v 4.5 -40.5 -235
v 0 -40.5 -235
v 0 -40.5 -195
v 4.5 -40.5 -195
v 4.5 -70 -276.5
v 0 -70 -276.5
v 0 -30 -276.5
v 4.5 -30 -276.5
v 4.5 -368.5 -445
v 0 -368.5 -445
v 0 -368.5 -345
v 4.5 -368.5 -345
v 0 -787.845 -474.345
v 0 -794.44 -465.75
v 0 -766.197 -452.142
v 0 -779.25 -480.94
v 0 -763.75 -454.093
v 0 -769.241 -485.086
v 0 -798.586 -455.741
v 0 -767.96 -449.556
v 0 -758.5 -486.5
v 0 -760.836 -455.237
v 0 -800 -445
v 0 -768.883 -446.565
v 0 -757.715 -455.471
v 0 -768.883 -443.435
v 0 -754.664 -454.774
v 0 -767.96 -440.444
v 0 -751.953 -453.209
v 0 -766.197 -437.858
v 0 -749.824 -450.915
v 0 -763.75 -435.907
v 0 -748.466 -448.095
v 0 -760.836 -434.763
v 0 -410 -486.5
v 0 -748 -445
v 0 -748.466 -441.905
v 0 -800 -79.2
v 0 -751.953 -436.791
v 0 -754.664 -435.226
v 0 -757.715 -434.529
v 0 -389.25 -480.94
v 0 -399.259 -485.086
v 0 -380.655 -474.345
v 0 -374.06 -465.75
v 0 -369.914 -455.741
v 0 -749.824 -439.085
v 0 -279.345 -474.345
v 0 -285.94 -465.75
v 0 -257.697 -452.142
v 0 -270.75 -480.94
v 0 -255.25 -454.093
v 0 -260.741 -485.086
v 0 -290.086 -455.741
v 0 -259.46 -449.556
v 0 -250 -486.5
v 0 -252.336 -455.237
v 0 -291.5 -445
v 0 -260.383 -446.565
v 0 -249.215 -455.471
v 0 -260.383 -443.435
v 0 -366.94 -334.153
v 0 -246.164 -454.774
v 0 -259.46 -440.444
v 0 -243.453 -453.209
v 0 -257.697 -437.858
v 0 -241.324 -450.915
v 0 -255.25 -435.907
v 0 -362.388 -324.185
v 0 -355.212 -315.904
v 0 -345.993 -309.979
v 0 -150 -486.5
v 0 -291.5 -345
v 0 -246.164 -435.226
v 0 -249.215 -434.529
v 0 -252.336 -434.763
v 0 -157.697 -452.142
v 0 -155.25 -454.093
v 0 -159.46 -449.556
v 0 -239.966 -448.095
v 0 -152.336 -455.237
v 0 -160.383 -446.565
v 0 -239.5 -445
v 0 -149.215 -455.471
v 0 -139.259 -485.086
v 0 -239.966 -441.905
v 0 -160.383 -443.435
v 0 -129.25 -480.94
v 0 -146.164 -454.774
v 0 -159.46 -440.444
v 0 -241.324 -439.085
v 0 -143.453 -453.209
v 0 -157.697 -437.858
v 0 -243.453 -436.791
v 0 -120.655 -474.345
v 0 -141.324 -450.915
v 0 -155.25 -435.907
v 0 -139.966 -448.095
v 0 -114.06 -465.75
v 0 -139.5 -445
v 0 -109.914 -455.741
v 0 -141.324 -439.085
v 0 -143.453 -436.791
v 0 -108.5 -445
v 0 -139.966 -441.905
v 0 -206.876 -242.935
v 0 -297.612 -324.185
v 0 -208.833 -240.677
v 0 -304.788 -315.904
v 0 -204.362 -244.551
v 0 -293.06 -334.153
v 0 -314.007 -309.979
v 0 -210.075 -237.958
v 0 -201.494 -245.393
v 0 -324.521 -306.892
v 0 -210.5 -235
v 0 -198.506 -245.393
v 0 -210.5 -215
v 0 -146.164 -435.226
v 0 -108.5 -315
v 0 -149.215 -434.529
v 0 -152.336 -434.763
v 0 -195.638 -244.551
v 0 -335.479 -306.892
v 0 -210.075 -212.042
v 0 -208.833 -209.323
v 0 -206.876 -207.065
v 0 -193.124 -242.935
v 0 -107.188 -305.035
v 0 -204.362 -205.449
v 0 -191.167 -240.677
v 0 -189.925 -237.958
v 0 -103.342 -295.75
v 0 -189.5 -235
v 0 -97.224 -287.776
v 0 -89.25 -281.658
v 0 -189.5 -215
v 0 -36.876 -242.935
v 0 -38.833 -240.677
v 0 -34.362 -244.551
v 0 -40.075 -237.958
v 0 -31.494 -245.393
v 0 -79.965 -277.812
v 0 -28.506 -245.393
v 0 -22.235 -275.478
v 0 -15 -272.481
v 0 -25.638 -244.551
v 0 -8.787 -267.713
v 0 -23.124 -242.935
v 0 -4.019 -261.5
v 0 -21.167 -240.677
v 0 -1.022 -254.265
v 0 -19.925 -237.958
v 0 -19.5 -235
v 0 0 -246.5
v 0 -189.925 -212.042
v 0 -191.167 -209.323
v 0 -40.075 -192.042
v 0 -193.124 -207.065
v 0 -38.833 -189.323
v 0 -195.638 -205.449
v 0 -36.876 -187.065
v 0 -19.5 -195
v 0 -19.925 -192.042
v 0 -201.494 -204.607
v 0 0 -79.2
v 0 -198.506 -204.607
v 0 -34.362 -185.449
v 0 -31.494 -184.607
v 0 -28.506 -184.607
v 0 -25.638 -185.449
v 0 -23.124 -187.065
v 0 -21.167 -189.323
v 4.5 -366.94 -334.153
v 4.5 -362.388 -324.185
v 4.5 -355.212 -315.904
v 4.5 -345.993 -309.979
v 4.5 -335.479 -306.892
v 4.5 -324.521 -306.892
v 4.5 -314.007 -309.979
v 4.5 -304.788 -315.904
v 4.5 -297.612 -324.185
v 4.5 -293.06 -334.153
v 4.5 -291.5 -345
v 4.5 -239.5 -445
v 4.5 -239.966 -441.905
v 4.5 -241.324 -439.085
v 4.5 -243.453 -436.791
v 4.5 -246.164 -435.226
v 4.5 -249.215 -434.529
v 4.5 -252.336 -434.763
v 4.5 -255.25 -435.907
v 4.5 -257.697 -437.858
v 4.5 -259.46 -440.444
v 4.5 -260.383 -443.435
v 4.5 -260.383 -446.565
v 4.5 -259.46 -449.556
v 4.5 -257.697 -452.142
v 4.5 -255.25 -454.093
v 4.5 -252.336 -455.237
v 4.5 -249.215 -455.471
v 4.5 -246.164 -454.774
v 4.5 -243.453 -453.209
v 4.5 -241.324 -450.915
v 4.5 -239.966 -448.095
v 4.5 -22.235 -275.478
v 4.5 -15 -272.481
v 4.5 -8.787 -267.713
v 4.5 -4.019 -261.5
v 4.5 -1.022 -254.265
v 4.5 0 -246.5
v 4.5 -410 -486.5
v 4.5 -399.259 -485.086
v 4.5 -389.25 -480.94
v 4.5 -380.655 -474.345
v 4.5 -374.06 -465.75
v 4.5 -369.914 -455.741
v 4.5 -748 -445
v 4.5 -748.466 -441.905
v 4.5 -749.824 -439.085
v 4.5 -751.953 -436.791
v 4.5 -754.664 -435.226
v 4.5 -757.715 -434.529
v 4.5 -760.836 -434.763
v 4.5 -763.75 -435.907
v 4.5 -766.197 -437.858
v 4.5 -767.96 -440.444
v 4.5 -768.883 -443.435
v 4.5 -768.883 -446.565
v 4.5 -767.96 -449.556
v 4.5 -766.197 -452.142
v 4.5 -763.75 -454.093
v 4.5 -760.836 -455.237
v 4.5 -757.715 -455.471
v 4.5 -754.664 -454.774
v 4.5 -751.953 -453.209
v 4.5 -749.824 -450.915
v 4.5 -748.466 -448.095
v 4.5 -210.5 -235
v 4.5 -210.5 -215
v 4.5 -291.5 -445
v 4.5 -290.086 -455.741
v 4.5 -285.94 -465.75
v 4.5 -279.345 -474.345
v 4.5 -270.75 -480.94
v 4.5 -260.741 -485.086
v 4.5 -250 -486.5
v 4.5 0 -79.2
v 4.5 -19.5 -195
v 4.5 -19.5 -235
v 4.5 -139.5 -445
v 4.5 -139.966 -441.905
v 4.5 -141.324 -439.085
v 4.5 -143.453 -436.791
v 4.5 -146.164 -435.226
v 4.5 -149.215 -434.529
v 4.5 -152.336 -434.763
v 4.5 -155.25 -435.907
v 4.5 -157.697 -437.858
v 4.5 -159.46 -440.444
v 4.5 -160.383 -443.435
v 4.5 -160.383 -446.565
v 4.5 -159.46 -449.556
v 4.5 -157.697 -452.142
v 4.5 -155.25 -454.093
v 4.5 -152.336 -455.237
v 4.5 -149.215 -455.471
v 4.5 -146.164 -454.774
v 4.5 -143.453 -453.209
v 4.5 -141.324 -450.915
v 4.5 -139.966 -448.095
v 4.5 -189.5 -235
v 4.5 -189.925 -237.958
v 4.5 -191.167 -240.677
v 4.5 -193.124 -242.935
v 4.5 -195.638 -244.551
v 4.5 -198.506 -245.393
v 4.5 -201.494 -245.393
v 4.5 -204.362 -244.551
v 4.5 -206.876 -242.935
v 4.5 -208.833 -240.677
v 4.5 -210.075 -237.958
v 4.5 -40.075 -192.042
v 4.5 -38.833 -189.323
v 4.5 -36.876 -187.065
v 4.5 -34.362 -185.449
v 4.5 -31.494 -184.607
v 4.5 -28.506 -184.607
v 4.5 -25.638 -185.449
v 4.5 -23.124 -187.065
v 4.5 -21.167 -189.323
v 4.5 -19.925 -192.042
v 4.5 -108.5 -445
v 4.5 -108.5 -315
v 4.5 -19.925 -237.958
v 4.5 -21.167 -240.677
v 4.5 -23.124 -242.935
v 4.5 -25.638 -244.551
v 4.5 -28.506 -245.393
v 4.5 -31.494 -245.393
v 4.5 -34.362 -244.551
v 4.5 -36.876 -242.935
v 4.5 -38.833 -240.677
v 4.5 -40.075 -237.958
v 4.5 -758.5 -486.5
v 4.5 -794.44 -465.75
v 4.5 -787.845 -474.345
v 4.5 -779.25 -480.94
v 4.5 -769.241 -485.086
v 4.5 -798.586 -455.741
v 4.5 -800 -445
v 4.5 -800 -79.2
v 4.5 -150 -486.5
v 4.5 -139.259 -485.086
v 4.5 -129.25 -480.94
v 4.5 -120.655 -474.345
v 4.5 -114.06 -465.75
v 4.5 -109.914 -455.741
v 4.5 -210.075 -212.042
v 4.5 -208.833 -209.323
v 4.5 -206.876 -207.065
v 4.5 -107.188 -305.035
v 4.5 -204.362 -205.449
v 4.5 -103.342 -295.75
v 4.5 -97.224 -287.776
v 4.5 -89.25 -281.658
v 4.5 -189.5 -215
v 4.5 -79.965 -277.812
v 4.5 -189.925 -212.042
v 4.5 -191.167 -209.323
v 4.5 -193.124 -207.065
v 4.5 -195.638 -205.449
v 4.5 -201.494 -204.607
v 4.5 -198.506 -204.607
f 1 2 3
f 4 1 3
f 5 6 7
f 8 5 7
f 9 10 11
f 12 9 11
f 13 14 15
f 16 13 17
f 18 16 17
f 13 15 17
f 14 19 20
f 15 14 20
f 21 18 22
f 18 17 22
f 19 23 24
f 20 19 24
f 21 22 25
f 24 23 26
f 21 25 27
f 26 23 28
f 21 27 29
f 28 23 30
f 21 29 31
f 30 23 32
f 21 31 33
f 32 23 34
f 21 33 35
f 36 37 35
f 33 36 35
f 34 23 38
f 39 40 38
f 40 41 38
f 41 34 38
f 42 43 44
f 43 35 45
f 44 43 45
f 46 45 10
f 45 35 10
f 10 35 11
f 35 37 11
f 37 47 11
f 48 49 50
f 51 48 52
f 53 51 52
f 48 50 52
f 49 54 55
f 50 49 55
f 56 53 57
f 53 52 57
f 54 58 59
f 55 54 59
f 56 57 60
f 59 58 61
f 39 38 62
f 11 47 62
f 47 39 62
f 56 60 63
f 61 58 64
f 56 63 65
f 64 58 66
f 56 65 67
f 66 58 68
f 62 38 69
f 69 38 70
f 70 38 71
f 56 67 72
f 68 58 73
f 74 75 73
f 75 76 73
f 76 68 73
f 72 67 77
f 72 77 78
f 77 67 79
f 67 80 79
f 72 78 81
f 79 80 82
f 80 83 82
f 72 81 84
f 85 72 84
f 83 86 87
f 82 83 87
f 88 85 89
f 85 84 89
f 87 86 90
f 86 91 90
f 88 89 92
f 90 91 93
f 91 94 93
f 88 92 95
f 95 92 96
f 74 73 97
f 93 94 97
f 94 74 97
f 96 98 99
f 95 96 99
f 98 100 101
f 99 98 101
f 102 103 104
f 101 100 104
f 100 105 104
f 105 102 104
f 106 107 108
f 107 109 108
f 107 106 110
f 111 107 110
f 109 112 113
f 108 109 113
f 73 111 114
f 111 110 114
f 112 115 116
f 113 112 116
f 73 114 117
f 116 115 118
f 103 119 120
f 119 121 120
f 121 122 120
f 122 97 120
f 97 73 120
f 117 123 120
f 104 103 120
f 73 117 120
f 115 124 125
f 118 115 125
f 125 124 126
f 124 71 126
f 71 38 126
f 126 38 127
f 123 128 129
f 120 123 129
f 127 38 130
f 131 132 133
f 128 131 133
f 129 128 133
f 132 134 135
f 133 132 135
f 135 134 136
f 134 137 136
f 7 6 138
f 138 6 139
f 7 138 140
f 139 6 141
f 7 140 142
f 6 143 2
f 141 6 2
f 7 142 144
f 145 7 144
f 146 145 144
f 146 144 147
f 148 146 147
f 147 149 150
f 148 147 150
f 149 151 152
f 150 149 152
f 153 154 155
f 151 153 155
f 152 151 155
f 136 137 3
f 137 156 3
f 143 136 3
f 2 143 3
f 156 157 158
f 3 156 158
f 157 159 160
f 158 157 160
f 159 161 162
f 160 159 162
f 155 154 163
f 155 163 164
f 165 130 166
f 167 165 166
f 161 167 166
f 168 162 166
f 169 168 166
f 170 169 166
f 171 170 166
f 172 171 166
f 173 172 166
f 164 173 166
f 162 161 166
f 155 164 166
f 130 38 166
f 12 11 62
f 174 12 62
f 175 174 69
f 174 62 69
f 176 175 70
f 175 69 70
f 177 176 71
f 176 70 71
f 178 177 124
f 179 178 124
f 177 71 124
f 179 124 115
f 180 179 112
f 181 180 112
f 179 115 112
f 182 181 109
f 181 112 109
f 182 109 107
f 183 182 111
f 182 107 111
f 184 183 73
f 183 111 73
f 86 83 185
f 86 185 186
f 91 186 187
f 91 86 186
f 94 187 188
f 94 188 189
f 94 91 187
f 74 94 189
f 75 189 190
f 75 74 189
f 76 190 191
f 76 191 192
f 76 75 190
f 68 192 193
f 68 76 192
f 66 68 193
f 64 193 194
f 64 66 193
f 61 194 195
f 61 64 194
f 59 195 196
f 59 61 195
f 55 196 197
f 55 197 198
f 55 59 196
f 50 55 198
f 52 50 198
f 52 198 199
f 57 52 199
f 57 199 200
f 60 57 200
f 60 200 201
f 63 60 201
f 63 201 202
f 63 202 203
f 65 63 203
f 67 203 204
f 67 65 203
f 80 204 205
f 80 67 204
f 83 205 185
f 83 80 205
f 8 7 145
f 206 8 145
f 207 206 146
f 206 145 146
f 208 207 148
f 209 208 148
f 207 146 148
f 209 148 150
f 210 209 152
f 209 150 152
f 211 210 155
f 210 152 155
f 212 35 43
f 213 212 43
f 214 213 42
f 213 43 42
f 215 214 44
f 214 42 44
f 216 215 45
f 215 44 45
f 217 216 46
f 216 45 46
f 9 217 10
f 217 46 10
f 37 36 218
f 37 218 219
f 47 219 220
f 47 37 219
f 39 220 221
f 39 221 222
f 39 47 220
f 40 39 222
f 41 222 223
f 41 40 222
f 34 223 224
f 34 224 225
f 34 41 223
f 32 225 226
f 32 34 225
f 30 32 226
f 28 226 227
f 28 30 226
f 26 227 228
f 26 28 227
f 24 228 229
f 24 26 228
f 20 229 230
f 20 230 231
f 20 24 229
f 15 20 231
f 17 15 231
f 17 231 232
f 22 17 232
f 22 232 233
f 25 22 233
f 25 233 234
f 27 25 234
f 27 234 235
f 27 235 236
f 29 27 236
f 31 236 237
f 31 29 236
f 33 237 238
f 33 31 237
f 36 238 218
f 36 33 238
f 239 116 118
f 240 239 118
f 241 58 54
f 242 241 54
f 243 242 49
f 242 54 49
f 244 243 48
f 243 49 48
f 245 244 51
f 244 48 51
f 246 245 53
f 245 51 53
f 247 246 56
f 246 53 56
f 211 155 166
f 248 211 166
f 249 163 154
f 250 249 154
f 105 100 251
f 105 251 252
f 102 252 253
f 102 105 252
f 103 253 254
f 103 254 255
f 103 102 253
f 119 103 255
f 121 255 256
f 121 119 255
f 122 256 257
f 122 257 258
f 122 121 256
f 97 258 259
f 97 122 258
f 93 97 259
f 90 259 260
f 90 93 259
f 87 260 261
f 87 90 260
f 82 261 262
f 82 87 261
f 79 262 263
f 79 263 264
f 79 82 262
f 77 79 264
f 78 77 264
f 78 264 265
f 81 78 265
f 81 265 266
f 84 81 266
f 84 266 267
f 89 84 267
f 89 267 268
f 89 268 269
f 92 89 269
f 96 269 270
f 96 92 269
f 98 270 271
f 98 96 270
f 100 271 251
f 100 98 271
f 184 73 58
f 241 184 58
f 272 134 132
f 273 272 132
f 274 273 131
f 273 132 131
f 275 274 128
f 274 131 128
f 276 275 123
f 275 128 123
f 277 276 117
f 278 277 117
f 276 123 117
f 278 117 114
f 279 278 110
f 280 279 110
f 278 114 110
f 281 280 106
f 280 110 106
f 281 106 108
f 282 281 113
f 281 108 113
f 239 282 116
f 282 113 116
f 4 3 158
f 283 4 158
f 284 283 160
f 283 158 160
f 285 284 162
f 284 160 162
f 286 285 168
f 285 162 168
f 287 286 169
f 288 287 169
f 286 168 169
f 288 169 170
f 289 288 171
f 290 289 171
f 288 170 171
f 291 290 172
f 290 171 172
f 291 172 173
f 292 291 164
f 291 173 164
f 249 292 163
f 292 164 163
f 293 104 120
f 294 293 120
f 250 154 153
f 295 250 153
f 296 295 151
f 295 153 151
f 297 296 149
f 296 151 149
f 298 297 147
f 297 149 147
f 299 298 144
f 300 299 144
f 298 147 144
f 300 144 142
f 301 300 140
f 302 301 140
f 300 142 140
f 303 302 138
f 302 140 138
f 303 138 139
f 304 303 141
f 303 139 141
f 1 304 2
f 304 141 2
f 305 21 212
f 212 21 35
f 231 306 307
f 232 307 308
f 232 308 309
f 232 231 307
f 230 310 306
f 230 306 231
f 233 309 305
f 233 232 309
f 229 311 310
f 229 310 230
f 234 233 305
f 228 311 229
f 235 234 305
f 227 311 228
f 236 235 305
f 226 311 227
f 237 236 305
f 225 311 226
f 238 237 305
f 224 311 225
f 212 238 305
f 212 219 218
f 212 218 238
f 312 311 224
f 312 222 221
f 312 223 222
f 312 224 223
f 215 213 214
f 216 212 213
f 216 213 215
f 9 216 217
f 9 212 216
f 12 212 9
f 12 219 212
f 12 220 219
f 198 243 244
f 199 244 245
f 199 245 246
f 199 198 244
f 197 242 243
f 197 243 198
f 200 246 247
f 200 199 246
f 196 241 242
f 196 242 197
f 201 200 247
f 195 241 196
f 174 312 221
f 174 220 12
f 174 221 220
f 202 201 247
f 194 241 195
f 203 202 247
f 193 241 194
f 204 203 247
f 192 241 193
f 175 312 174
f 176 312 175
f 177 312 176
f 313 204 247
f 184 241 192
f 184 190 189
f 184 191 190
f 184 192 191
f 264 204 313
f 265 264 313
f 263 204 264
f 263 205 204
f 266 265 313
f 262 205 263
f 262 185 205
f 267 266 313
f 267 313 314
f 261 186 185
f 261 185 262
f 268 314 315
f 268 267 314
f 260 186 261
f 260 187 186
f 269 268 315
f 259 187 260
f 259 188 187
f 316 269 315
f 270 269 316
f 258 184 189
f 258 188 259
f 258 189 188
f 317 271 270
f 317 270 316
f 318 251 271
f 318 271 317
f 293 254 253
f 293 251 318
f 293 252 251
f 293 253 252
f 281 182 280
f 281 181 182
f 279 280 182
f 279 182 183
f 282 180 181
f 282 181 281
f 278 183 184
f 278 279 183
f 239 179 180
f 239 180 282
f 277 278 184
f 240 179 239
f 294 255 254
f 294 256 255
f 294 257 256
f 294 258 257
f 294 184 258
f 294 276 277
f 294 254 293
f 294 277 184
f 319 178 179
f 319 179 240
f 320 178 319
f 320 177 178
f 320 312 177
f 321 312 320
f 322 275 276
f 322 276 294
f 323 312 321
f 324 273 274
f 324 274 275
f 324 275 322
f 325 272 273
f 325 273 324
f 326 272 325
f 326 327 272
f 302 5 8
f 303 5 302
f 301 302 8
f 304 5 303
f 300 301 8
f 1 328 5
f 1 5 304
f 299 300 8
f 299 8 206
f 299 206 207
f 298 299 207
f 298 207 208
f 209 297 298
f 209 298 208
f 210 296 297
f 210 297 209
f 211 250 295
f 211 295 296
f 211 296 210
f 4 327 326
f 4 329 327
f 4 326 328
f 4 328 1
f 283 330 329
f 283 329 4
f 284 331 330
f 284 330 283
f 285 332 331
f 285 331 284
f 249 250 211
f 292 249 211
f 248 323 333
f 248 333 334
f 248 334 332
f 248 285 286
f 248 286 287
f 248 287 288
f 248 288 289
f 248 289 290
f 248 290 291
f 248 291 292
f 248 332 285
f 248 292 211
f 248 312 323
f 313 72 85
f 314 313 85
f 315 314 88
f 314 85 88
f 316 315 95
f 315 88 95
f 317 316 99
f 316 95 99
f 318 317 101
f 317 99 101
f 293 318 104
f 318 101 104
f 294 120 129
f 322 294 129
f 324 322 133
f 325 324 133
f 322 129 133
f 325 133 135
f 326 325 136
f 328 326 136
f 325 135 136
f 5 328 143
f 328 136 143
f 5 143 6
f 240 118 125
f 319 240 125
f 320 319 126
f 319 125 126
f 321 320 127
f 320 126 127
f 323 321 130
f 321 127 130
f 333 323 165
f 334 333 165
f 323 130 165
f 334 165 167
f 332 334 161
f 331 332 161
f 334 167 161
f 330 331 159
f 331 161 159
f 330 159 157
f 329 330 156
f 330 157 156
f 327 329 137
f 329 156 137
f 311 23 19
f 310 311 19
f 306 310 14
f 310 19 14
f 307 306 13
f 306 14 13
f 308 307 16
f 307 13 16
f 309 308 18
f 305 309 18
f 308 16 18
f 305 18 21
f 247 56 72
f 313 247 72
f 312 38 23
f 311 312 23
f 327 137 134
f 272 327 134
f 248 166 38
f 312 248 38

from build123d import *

# Parameters (mm, degrees)
F0_R     = 10.5
F1_DEPTH = 4.5


# Not quite as in the source:
# - a feature names something its author has since deleted; it is built from what else it names


with BuildPart() as f1:
    # F0 (on Right) → F1 (new body)
    with BuildSketch(Plane.YZ):
        with BuildLine():
            Line((-800, -79.2), (-800, -246.5))
            Line((-800, -246.5), (-800, -445))
            ThreePointArc((-800, -445), (-787.8449314192, -474.3449314192), (-758.5, -486.5))
            Line((-758.5, -486.5), (-410, -486.5))
            ThreePointArc((-410, -486.5), (-380.6550685808, -474.3449314192), (-368.5, -445))
            Line((-368.5, -445), (-368.5, -345))
            ThreePointArc((-368.5, -345), (-330, -306.5), (-291.5, -345))
            Line((-291.5, -345), (-291.5, -445))
            ThreePointArc((-291.5, -445), (-279.3449314192, -474.3449314192), (-250, -486.5))
            Line((-250, -486.5), (-150, -486.5))
            ThreePointArc((-150, -486.5), (-120.6550685808, -474.3449314192), (-108.5, -445))
            Line((-108.5, -445), (-108.5, -315))
            ThreePointArc((-108.5, -315), (-97.2236110757, -287.7763889243), (-70, -276.5))
            Line((-70, -276.5), (-30, -276.5))
            ThreePointArc((-30, -276.5), (-8.7867965644, -267.7132034356), (0, -246.5))
            Line((0, -246.5), (0, -79.2))
            Line((0, -79.2), (-800, -79.2))
        make_face()
        with Locations((-758.5, -445)):
            Circle(F0_R, mode=Mode.SUBTRACT)
        with Locations((-250, -445)):
            Circle(F0_R, mode=Mode.SUBTRACT)
        with Locations((-150, -445)):
            Circle(F0_R, mode=Mode.SUBTRACT)
        with BuildLine():
            ThreePointArc((-210.5, -215), (-200, -204.5), (-189.5, -215))
            Line((-189.5, -215), (-189.5, -235))
            ThreePointArc((-189.5, -235), (-200, -245.5), (-210.5, -235))
            Line((-210.5, -235), (-210.5, -215))
        make_face(mode=Mode.SUBTRACT)
        with BuildLine():
            ThreePointArc((-40.5, -195), (-30, -184.5), (-19.5, -195))
            Line((-19.5, -195), (-19.5, -235))
            ThreePointArc((-19.5, -235), (-30, -245.5), (-40.5, -235))
            Line((-40.5, -235), (-40.5, -195))
        make_face(mode=Mode.SUBTRACT)
    extrude(amount=F1_DEPTH)


solid = f1.part
